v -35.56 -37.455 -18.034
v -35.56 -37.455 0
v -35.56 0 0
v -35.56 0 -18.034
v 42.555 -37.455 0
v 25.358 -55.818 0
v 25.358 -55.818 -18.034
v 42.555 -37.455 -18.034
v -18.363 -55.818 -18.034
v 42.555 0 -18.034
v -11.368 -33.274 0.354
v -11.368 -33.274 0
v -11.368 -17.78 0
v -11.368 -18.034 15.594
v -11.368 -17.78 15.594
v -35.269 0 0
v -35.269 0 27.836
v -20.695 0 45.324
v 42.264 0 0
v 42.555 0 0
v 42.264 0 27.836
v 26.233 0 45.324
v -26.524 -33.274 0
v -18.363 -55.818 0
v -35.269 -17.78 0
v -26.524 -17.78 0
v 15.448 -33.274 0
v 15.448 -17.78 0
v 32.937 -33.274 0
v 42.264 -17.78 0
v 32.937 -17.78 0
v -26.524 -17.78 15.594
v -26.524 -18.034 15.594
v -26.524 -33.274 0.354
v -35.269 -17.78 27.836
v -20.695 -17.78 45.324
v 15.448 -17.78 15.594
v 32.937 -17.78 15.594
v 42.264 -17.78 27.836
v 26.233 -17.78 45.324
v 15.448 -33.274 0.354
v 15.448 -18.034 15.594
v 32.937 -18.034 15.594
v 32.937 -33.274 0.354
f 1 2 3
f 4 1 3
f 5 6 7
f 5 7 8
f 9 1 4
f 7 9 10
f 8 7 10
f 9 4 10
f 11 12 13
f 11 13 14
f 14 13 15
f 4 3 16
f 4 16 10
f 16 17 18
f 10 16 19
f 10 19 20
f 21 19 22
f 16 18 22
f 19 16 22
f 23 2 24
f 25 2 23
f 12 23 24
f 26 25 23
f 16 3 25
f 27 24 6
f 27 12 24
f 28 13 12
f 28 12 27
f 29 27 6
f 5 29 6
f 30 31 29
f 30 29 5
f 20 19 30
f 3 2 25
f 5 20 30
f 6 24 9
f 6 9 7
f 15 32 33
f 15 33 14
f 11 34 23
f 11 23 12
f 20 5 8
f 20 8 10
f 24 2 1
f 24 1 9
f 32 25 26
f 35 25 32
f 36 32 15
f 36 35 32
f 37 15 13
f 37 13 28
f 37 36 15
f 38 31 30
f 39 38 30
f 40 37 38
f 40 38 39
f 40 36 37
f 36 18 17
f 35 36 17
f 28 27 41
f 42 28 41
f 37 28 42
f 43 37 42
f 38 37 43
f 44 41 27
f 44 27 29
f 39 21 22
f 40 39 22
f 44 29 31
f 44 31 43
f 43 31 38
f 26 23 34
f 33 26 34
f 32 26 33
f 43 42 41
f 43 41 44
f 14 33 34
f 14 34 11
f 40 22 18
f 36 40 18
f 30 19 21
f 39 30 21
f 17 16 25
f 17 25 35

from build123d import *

# Parameters (mm, degrees)
F0_W     = 77.532463
F0_H     = 27.835902
F1_DEPTH = 17.78
F2_W     = 78.115414
F2_H     = 37.45459
F3_DEPTH = 18.034
F4_W     = 15.156722
F4_H     = 15.593934
F4_W_2   = 17.48852
F5_DEPTH = 15.494
F6_SIZE  = 15.24


with BuildPart() as f1:
    # F0 (on Front) → F1 (new body)
    with BuildSketch(Plane.XZ):
        with Locations((3.497705, 13.917951)):
            Rectangle(F0_W, F0_H)
        Polygon((-20.694755, 45.324426), (-35.268527, 27.835902), (42.263936, 27.835902), (26.232786, 45.324426), align=None)
    extrude(amount=F1_DEPTH)

    # F2 (on Top) → F3 (join)
    with BuildSketch(Plane.XY):
        with Locations((3.497703, -18.727295)):
            Rectangle(F2_W, F2_H)
        Polygon((25.35836, -55.817544), (42.55541, -37.45459), (-35.560004, -37.45459), (-18.362952, -55.817544), align=None)
    extrude(amount=-F3_DEPTH)

    # F4 (on face) → F5 (join)
    with BuildSketch(Plane.XZ.offset(17.78)):
        with Locations((-18.945902, 7.796967)):
            Rectangle(F4_W, F4_H)
        with Locations((24.192458, 7.796967)):
            Rectangle(F4_W_2, F4_H)
    extrude(amount=F5_DEPTH)

    # F6
    f6_edges = [f1.edges().sort_by_distance(p)[0] for p in [
        (-18.945902, -33.274, 15.593934),
        (24.192458, -33.274, 15.593934),
    ]]
    chamfer(f6_edges, length=F6_SIZE)


solid = f1.part
